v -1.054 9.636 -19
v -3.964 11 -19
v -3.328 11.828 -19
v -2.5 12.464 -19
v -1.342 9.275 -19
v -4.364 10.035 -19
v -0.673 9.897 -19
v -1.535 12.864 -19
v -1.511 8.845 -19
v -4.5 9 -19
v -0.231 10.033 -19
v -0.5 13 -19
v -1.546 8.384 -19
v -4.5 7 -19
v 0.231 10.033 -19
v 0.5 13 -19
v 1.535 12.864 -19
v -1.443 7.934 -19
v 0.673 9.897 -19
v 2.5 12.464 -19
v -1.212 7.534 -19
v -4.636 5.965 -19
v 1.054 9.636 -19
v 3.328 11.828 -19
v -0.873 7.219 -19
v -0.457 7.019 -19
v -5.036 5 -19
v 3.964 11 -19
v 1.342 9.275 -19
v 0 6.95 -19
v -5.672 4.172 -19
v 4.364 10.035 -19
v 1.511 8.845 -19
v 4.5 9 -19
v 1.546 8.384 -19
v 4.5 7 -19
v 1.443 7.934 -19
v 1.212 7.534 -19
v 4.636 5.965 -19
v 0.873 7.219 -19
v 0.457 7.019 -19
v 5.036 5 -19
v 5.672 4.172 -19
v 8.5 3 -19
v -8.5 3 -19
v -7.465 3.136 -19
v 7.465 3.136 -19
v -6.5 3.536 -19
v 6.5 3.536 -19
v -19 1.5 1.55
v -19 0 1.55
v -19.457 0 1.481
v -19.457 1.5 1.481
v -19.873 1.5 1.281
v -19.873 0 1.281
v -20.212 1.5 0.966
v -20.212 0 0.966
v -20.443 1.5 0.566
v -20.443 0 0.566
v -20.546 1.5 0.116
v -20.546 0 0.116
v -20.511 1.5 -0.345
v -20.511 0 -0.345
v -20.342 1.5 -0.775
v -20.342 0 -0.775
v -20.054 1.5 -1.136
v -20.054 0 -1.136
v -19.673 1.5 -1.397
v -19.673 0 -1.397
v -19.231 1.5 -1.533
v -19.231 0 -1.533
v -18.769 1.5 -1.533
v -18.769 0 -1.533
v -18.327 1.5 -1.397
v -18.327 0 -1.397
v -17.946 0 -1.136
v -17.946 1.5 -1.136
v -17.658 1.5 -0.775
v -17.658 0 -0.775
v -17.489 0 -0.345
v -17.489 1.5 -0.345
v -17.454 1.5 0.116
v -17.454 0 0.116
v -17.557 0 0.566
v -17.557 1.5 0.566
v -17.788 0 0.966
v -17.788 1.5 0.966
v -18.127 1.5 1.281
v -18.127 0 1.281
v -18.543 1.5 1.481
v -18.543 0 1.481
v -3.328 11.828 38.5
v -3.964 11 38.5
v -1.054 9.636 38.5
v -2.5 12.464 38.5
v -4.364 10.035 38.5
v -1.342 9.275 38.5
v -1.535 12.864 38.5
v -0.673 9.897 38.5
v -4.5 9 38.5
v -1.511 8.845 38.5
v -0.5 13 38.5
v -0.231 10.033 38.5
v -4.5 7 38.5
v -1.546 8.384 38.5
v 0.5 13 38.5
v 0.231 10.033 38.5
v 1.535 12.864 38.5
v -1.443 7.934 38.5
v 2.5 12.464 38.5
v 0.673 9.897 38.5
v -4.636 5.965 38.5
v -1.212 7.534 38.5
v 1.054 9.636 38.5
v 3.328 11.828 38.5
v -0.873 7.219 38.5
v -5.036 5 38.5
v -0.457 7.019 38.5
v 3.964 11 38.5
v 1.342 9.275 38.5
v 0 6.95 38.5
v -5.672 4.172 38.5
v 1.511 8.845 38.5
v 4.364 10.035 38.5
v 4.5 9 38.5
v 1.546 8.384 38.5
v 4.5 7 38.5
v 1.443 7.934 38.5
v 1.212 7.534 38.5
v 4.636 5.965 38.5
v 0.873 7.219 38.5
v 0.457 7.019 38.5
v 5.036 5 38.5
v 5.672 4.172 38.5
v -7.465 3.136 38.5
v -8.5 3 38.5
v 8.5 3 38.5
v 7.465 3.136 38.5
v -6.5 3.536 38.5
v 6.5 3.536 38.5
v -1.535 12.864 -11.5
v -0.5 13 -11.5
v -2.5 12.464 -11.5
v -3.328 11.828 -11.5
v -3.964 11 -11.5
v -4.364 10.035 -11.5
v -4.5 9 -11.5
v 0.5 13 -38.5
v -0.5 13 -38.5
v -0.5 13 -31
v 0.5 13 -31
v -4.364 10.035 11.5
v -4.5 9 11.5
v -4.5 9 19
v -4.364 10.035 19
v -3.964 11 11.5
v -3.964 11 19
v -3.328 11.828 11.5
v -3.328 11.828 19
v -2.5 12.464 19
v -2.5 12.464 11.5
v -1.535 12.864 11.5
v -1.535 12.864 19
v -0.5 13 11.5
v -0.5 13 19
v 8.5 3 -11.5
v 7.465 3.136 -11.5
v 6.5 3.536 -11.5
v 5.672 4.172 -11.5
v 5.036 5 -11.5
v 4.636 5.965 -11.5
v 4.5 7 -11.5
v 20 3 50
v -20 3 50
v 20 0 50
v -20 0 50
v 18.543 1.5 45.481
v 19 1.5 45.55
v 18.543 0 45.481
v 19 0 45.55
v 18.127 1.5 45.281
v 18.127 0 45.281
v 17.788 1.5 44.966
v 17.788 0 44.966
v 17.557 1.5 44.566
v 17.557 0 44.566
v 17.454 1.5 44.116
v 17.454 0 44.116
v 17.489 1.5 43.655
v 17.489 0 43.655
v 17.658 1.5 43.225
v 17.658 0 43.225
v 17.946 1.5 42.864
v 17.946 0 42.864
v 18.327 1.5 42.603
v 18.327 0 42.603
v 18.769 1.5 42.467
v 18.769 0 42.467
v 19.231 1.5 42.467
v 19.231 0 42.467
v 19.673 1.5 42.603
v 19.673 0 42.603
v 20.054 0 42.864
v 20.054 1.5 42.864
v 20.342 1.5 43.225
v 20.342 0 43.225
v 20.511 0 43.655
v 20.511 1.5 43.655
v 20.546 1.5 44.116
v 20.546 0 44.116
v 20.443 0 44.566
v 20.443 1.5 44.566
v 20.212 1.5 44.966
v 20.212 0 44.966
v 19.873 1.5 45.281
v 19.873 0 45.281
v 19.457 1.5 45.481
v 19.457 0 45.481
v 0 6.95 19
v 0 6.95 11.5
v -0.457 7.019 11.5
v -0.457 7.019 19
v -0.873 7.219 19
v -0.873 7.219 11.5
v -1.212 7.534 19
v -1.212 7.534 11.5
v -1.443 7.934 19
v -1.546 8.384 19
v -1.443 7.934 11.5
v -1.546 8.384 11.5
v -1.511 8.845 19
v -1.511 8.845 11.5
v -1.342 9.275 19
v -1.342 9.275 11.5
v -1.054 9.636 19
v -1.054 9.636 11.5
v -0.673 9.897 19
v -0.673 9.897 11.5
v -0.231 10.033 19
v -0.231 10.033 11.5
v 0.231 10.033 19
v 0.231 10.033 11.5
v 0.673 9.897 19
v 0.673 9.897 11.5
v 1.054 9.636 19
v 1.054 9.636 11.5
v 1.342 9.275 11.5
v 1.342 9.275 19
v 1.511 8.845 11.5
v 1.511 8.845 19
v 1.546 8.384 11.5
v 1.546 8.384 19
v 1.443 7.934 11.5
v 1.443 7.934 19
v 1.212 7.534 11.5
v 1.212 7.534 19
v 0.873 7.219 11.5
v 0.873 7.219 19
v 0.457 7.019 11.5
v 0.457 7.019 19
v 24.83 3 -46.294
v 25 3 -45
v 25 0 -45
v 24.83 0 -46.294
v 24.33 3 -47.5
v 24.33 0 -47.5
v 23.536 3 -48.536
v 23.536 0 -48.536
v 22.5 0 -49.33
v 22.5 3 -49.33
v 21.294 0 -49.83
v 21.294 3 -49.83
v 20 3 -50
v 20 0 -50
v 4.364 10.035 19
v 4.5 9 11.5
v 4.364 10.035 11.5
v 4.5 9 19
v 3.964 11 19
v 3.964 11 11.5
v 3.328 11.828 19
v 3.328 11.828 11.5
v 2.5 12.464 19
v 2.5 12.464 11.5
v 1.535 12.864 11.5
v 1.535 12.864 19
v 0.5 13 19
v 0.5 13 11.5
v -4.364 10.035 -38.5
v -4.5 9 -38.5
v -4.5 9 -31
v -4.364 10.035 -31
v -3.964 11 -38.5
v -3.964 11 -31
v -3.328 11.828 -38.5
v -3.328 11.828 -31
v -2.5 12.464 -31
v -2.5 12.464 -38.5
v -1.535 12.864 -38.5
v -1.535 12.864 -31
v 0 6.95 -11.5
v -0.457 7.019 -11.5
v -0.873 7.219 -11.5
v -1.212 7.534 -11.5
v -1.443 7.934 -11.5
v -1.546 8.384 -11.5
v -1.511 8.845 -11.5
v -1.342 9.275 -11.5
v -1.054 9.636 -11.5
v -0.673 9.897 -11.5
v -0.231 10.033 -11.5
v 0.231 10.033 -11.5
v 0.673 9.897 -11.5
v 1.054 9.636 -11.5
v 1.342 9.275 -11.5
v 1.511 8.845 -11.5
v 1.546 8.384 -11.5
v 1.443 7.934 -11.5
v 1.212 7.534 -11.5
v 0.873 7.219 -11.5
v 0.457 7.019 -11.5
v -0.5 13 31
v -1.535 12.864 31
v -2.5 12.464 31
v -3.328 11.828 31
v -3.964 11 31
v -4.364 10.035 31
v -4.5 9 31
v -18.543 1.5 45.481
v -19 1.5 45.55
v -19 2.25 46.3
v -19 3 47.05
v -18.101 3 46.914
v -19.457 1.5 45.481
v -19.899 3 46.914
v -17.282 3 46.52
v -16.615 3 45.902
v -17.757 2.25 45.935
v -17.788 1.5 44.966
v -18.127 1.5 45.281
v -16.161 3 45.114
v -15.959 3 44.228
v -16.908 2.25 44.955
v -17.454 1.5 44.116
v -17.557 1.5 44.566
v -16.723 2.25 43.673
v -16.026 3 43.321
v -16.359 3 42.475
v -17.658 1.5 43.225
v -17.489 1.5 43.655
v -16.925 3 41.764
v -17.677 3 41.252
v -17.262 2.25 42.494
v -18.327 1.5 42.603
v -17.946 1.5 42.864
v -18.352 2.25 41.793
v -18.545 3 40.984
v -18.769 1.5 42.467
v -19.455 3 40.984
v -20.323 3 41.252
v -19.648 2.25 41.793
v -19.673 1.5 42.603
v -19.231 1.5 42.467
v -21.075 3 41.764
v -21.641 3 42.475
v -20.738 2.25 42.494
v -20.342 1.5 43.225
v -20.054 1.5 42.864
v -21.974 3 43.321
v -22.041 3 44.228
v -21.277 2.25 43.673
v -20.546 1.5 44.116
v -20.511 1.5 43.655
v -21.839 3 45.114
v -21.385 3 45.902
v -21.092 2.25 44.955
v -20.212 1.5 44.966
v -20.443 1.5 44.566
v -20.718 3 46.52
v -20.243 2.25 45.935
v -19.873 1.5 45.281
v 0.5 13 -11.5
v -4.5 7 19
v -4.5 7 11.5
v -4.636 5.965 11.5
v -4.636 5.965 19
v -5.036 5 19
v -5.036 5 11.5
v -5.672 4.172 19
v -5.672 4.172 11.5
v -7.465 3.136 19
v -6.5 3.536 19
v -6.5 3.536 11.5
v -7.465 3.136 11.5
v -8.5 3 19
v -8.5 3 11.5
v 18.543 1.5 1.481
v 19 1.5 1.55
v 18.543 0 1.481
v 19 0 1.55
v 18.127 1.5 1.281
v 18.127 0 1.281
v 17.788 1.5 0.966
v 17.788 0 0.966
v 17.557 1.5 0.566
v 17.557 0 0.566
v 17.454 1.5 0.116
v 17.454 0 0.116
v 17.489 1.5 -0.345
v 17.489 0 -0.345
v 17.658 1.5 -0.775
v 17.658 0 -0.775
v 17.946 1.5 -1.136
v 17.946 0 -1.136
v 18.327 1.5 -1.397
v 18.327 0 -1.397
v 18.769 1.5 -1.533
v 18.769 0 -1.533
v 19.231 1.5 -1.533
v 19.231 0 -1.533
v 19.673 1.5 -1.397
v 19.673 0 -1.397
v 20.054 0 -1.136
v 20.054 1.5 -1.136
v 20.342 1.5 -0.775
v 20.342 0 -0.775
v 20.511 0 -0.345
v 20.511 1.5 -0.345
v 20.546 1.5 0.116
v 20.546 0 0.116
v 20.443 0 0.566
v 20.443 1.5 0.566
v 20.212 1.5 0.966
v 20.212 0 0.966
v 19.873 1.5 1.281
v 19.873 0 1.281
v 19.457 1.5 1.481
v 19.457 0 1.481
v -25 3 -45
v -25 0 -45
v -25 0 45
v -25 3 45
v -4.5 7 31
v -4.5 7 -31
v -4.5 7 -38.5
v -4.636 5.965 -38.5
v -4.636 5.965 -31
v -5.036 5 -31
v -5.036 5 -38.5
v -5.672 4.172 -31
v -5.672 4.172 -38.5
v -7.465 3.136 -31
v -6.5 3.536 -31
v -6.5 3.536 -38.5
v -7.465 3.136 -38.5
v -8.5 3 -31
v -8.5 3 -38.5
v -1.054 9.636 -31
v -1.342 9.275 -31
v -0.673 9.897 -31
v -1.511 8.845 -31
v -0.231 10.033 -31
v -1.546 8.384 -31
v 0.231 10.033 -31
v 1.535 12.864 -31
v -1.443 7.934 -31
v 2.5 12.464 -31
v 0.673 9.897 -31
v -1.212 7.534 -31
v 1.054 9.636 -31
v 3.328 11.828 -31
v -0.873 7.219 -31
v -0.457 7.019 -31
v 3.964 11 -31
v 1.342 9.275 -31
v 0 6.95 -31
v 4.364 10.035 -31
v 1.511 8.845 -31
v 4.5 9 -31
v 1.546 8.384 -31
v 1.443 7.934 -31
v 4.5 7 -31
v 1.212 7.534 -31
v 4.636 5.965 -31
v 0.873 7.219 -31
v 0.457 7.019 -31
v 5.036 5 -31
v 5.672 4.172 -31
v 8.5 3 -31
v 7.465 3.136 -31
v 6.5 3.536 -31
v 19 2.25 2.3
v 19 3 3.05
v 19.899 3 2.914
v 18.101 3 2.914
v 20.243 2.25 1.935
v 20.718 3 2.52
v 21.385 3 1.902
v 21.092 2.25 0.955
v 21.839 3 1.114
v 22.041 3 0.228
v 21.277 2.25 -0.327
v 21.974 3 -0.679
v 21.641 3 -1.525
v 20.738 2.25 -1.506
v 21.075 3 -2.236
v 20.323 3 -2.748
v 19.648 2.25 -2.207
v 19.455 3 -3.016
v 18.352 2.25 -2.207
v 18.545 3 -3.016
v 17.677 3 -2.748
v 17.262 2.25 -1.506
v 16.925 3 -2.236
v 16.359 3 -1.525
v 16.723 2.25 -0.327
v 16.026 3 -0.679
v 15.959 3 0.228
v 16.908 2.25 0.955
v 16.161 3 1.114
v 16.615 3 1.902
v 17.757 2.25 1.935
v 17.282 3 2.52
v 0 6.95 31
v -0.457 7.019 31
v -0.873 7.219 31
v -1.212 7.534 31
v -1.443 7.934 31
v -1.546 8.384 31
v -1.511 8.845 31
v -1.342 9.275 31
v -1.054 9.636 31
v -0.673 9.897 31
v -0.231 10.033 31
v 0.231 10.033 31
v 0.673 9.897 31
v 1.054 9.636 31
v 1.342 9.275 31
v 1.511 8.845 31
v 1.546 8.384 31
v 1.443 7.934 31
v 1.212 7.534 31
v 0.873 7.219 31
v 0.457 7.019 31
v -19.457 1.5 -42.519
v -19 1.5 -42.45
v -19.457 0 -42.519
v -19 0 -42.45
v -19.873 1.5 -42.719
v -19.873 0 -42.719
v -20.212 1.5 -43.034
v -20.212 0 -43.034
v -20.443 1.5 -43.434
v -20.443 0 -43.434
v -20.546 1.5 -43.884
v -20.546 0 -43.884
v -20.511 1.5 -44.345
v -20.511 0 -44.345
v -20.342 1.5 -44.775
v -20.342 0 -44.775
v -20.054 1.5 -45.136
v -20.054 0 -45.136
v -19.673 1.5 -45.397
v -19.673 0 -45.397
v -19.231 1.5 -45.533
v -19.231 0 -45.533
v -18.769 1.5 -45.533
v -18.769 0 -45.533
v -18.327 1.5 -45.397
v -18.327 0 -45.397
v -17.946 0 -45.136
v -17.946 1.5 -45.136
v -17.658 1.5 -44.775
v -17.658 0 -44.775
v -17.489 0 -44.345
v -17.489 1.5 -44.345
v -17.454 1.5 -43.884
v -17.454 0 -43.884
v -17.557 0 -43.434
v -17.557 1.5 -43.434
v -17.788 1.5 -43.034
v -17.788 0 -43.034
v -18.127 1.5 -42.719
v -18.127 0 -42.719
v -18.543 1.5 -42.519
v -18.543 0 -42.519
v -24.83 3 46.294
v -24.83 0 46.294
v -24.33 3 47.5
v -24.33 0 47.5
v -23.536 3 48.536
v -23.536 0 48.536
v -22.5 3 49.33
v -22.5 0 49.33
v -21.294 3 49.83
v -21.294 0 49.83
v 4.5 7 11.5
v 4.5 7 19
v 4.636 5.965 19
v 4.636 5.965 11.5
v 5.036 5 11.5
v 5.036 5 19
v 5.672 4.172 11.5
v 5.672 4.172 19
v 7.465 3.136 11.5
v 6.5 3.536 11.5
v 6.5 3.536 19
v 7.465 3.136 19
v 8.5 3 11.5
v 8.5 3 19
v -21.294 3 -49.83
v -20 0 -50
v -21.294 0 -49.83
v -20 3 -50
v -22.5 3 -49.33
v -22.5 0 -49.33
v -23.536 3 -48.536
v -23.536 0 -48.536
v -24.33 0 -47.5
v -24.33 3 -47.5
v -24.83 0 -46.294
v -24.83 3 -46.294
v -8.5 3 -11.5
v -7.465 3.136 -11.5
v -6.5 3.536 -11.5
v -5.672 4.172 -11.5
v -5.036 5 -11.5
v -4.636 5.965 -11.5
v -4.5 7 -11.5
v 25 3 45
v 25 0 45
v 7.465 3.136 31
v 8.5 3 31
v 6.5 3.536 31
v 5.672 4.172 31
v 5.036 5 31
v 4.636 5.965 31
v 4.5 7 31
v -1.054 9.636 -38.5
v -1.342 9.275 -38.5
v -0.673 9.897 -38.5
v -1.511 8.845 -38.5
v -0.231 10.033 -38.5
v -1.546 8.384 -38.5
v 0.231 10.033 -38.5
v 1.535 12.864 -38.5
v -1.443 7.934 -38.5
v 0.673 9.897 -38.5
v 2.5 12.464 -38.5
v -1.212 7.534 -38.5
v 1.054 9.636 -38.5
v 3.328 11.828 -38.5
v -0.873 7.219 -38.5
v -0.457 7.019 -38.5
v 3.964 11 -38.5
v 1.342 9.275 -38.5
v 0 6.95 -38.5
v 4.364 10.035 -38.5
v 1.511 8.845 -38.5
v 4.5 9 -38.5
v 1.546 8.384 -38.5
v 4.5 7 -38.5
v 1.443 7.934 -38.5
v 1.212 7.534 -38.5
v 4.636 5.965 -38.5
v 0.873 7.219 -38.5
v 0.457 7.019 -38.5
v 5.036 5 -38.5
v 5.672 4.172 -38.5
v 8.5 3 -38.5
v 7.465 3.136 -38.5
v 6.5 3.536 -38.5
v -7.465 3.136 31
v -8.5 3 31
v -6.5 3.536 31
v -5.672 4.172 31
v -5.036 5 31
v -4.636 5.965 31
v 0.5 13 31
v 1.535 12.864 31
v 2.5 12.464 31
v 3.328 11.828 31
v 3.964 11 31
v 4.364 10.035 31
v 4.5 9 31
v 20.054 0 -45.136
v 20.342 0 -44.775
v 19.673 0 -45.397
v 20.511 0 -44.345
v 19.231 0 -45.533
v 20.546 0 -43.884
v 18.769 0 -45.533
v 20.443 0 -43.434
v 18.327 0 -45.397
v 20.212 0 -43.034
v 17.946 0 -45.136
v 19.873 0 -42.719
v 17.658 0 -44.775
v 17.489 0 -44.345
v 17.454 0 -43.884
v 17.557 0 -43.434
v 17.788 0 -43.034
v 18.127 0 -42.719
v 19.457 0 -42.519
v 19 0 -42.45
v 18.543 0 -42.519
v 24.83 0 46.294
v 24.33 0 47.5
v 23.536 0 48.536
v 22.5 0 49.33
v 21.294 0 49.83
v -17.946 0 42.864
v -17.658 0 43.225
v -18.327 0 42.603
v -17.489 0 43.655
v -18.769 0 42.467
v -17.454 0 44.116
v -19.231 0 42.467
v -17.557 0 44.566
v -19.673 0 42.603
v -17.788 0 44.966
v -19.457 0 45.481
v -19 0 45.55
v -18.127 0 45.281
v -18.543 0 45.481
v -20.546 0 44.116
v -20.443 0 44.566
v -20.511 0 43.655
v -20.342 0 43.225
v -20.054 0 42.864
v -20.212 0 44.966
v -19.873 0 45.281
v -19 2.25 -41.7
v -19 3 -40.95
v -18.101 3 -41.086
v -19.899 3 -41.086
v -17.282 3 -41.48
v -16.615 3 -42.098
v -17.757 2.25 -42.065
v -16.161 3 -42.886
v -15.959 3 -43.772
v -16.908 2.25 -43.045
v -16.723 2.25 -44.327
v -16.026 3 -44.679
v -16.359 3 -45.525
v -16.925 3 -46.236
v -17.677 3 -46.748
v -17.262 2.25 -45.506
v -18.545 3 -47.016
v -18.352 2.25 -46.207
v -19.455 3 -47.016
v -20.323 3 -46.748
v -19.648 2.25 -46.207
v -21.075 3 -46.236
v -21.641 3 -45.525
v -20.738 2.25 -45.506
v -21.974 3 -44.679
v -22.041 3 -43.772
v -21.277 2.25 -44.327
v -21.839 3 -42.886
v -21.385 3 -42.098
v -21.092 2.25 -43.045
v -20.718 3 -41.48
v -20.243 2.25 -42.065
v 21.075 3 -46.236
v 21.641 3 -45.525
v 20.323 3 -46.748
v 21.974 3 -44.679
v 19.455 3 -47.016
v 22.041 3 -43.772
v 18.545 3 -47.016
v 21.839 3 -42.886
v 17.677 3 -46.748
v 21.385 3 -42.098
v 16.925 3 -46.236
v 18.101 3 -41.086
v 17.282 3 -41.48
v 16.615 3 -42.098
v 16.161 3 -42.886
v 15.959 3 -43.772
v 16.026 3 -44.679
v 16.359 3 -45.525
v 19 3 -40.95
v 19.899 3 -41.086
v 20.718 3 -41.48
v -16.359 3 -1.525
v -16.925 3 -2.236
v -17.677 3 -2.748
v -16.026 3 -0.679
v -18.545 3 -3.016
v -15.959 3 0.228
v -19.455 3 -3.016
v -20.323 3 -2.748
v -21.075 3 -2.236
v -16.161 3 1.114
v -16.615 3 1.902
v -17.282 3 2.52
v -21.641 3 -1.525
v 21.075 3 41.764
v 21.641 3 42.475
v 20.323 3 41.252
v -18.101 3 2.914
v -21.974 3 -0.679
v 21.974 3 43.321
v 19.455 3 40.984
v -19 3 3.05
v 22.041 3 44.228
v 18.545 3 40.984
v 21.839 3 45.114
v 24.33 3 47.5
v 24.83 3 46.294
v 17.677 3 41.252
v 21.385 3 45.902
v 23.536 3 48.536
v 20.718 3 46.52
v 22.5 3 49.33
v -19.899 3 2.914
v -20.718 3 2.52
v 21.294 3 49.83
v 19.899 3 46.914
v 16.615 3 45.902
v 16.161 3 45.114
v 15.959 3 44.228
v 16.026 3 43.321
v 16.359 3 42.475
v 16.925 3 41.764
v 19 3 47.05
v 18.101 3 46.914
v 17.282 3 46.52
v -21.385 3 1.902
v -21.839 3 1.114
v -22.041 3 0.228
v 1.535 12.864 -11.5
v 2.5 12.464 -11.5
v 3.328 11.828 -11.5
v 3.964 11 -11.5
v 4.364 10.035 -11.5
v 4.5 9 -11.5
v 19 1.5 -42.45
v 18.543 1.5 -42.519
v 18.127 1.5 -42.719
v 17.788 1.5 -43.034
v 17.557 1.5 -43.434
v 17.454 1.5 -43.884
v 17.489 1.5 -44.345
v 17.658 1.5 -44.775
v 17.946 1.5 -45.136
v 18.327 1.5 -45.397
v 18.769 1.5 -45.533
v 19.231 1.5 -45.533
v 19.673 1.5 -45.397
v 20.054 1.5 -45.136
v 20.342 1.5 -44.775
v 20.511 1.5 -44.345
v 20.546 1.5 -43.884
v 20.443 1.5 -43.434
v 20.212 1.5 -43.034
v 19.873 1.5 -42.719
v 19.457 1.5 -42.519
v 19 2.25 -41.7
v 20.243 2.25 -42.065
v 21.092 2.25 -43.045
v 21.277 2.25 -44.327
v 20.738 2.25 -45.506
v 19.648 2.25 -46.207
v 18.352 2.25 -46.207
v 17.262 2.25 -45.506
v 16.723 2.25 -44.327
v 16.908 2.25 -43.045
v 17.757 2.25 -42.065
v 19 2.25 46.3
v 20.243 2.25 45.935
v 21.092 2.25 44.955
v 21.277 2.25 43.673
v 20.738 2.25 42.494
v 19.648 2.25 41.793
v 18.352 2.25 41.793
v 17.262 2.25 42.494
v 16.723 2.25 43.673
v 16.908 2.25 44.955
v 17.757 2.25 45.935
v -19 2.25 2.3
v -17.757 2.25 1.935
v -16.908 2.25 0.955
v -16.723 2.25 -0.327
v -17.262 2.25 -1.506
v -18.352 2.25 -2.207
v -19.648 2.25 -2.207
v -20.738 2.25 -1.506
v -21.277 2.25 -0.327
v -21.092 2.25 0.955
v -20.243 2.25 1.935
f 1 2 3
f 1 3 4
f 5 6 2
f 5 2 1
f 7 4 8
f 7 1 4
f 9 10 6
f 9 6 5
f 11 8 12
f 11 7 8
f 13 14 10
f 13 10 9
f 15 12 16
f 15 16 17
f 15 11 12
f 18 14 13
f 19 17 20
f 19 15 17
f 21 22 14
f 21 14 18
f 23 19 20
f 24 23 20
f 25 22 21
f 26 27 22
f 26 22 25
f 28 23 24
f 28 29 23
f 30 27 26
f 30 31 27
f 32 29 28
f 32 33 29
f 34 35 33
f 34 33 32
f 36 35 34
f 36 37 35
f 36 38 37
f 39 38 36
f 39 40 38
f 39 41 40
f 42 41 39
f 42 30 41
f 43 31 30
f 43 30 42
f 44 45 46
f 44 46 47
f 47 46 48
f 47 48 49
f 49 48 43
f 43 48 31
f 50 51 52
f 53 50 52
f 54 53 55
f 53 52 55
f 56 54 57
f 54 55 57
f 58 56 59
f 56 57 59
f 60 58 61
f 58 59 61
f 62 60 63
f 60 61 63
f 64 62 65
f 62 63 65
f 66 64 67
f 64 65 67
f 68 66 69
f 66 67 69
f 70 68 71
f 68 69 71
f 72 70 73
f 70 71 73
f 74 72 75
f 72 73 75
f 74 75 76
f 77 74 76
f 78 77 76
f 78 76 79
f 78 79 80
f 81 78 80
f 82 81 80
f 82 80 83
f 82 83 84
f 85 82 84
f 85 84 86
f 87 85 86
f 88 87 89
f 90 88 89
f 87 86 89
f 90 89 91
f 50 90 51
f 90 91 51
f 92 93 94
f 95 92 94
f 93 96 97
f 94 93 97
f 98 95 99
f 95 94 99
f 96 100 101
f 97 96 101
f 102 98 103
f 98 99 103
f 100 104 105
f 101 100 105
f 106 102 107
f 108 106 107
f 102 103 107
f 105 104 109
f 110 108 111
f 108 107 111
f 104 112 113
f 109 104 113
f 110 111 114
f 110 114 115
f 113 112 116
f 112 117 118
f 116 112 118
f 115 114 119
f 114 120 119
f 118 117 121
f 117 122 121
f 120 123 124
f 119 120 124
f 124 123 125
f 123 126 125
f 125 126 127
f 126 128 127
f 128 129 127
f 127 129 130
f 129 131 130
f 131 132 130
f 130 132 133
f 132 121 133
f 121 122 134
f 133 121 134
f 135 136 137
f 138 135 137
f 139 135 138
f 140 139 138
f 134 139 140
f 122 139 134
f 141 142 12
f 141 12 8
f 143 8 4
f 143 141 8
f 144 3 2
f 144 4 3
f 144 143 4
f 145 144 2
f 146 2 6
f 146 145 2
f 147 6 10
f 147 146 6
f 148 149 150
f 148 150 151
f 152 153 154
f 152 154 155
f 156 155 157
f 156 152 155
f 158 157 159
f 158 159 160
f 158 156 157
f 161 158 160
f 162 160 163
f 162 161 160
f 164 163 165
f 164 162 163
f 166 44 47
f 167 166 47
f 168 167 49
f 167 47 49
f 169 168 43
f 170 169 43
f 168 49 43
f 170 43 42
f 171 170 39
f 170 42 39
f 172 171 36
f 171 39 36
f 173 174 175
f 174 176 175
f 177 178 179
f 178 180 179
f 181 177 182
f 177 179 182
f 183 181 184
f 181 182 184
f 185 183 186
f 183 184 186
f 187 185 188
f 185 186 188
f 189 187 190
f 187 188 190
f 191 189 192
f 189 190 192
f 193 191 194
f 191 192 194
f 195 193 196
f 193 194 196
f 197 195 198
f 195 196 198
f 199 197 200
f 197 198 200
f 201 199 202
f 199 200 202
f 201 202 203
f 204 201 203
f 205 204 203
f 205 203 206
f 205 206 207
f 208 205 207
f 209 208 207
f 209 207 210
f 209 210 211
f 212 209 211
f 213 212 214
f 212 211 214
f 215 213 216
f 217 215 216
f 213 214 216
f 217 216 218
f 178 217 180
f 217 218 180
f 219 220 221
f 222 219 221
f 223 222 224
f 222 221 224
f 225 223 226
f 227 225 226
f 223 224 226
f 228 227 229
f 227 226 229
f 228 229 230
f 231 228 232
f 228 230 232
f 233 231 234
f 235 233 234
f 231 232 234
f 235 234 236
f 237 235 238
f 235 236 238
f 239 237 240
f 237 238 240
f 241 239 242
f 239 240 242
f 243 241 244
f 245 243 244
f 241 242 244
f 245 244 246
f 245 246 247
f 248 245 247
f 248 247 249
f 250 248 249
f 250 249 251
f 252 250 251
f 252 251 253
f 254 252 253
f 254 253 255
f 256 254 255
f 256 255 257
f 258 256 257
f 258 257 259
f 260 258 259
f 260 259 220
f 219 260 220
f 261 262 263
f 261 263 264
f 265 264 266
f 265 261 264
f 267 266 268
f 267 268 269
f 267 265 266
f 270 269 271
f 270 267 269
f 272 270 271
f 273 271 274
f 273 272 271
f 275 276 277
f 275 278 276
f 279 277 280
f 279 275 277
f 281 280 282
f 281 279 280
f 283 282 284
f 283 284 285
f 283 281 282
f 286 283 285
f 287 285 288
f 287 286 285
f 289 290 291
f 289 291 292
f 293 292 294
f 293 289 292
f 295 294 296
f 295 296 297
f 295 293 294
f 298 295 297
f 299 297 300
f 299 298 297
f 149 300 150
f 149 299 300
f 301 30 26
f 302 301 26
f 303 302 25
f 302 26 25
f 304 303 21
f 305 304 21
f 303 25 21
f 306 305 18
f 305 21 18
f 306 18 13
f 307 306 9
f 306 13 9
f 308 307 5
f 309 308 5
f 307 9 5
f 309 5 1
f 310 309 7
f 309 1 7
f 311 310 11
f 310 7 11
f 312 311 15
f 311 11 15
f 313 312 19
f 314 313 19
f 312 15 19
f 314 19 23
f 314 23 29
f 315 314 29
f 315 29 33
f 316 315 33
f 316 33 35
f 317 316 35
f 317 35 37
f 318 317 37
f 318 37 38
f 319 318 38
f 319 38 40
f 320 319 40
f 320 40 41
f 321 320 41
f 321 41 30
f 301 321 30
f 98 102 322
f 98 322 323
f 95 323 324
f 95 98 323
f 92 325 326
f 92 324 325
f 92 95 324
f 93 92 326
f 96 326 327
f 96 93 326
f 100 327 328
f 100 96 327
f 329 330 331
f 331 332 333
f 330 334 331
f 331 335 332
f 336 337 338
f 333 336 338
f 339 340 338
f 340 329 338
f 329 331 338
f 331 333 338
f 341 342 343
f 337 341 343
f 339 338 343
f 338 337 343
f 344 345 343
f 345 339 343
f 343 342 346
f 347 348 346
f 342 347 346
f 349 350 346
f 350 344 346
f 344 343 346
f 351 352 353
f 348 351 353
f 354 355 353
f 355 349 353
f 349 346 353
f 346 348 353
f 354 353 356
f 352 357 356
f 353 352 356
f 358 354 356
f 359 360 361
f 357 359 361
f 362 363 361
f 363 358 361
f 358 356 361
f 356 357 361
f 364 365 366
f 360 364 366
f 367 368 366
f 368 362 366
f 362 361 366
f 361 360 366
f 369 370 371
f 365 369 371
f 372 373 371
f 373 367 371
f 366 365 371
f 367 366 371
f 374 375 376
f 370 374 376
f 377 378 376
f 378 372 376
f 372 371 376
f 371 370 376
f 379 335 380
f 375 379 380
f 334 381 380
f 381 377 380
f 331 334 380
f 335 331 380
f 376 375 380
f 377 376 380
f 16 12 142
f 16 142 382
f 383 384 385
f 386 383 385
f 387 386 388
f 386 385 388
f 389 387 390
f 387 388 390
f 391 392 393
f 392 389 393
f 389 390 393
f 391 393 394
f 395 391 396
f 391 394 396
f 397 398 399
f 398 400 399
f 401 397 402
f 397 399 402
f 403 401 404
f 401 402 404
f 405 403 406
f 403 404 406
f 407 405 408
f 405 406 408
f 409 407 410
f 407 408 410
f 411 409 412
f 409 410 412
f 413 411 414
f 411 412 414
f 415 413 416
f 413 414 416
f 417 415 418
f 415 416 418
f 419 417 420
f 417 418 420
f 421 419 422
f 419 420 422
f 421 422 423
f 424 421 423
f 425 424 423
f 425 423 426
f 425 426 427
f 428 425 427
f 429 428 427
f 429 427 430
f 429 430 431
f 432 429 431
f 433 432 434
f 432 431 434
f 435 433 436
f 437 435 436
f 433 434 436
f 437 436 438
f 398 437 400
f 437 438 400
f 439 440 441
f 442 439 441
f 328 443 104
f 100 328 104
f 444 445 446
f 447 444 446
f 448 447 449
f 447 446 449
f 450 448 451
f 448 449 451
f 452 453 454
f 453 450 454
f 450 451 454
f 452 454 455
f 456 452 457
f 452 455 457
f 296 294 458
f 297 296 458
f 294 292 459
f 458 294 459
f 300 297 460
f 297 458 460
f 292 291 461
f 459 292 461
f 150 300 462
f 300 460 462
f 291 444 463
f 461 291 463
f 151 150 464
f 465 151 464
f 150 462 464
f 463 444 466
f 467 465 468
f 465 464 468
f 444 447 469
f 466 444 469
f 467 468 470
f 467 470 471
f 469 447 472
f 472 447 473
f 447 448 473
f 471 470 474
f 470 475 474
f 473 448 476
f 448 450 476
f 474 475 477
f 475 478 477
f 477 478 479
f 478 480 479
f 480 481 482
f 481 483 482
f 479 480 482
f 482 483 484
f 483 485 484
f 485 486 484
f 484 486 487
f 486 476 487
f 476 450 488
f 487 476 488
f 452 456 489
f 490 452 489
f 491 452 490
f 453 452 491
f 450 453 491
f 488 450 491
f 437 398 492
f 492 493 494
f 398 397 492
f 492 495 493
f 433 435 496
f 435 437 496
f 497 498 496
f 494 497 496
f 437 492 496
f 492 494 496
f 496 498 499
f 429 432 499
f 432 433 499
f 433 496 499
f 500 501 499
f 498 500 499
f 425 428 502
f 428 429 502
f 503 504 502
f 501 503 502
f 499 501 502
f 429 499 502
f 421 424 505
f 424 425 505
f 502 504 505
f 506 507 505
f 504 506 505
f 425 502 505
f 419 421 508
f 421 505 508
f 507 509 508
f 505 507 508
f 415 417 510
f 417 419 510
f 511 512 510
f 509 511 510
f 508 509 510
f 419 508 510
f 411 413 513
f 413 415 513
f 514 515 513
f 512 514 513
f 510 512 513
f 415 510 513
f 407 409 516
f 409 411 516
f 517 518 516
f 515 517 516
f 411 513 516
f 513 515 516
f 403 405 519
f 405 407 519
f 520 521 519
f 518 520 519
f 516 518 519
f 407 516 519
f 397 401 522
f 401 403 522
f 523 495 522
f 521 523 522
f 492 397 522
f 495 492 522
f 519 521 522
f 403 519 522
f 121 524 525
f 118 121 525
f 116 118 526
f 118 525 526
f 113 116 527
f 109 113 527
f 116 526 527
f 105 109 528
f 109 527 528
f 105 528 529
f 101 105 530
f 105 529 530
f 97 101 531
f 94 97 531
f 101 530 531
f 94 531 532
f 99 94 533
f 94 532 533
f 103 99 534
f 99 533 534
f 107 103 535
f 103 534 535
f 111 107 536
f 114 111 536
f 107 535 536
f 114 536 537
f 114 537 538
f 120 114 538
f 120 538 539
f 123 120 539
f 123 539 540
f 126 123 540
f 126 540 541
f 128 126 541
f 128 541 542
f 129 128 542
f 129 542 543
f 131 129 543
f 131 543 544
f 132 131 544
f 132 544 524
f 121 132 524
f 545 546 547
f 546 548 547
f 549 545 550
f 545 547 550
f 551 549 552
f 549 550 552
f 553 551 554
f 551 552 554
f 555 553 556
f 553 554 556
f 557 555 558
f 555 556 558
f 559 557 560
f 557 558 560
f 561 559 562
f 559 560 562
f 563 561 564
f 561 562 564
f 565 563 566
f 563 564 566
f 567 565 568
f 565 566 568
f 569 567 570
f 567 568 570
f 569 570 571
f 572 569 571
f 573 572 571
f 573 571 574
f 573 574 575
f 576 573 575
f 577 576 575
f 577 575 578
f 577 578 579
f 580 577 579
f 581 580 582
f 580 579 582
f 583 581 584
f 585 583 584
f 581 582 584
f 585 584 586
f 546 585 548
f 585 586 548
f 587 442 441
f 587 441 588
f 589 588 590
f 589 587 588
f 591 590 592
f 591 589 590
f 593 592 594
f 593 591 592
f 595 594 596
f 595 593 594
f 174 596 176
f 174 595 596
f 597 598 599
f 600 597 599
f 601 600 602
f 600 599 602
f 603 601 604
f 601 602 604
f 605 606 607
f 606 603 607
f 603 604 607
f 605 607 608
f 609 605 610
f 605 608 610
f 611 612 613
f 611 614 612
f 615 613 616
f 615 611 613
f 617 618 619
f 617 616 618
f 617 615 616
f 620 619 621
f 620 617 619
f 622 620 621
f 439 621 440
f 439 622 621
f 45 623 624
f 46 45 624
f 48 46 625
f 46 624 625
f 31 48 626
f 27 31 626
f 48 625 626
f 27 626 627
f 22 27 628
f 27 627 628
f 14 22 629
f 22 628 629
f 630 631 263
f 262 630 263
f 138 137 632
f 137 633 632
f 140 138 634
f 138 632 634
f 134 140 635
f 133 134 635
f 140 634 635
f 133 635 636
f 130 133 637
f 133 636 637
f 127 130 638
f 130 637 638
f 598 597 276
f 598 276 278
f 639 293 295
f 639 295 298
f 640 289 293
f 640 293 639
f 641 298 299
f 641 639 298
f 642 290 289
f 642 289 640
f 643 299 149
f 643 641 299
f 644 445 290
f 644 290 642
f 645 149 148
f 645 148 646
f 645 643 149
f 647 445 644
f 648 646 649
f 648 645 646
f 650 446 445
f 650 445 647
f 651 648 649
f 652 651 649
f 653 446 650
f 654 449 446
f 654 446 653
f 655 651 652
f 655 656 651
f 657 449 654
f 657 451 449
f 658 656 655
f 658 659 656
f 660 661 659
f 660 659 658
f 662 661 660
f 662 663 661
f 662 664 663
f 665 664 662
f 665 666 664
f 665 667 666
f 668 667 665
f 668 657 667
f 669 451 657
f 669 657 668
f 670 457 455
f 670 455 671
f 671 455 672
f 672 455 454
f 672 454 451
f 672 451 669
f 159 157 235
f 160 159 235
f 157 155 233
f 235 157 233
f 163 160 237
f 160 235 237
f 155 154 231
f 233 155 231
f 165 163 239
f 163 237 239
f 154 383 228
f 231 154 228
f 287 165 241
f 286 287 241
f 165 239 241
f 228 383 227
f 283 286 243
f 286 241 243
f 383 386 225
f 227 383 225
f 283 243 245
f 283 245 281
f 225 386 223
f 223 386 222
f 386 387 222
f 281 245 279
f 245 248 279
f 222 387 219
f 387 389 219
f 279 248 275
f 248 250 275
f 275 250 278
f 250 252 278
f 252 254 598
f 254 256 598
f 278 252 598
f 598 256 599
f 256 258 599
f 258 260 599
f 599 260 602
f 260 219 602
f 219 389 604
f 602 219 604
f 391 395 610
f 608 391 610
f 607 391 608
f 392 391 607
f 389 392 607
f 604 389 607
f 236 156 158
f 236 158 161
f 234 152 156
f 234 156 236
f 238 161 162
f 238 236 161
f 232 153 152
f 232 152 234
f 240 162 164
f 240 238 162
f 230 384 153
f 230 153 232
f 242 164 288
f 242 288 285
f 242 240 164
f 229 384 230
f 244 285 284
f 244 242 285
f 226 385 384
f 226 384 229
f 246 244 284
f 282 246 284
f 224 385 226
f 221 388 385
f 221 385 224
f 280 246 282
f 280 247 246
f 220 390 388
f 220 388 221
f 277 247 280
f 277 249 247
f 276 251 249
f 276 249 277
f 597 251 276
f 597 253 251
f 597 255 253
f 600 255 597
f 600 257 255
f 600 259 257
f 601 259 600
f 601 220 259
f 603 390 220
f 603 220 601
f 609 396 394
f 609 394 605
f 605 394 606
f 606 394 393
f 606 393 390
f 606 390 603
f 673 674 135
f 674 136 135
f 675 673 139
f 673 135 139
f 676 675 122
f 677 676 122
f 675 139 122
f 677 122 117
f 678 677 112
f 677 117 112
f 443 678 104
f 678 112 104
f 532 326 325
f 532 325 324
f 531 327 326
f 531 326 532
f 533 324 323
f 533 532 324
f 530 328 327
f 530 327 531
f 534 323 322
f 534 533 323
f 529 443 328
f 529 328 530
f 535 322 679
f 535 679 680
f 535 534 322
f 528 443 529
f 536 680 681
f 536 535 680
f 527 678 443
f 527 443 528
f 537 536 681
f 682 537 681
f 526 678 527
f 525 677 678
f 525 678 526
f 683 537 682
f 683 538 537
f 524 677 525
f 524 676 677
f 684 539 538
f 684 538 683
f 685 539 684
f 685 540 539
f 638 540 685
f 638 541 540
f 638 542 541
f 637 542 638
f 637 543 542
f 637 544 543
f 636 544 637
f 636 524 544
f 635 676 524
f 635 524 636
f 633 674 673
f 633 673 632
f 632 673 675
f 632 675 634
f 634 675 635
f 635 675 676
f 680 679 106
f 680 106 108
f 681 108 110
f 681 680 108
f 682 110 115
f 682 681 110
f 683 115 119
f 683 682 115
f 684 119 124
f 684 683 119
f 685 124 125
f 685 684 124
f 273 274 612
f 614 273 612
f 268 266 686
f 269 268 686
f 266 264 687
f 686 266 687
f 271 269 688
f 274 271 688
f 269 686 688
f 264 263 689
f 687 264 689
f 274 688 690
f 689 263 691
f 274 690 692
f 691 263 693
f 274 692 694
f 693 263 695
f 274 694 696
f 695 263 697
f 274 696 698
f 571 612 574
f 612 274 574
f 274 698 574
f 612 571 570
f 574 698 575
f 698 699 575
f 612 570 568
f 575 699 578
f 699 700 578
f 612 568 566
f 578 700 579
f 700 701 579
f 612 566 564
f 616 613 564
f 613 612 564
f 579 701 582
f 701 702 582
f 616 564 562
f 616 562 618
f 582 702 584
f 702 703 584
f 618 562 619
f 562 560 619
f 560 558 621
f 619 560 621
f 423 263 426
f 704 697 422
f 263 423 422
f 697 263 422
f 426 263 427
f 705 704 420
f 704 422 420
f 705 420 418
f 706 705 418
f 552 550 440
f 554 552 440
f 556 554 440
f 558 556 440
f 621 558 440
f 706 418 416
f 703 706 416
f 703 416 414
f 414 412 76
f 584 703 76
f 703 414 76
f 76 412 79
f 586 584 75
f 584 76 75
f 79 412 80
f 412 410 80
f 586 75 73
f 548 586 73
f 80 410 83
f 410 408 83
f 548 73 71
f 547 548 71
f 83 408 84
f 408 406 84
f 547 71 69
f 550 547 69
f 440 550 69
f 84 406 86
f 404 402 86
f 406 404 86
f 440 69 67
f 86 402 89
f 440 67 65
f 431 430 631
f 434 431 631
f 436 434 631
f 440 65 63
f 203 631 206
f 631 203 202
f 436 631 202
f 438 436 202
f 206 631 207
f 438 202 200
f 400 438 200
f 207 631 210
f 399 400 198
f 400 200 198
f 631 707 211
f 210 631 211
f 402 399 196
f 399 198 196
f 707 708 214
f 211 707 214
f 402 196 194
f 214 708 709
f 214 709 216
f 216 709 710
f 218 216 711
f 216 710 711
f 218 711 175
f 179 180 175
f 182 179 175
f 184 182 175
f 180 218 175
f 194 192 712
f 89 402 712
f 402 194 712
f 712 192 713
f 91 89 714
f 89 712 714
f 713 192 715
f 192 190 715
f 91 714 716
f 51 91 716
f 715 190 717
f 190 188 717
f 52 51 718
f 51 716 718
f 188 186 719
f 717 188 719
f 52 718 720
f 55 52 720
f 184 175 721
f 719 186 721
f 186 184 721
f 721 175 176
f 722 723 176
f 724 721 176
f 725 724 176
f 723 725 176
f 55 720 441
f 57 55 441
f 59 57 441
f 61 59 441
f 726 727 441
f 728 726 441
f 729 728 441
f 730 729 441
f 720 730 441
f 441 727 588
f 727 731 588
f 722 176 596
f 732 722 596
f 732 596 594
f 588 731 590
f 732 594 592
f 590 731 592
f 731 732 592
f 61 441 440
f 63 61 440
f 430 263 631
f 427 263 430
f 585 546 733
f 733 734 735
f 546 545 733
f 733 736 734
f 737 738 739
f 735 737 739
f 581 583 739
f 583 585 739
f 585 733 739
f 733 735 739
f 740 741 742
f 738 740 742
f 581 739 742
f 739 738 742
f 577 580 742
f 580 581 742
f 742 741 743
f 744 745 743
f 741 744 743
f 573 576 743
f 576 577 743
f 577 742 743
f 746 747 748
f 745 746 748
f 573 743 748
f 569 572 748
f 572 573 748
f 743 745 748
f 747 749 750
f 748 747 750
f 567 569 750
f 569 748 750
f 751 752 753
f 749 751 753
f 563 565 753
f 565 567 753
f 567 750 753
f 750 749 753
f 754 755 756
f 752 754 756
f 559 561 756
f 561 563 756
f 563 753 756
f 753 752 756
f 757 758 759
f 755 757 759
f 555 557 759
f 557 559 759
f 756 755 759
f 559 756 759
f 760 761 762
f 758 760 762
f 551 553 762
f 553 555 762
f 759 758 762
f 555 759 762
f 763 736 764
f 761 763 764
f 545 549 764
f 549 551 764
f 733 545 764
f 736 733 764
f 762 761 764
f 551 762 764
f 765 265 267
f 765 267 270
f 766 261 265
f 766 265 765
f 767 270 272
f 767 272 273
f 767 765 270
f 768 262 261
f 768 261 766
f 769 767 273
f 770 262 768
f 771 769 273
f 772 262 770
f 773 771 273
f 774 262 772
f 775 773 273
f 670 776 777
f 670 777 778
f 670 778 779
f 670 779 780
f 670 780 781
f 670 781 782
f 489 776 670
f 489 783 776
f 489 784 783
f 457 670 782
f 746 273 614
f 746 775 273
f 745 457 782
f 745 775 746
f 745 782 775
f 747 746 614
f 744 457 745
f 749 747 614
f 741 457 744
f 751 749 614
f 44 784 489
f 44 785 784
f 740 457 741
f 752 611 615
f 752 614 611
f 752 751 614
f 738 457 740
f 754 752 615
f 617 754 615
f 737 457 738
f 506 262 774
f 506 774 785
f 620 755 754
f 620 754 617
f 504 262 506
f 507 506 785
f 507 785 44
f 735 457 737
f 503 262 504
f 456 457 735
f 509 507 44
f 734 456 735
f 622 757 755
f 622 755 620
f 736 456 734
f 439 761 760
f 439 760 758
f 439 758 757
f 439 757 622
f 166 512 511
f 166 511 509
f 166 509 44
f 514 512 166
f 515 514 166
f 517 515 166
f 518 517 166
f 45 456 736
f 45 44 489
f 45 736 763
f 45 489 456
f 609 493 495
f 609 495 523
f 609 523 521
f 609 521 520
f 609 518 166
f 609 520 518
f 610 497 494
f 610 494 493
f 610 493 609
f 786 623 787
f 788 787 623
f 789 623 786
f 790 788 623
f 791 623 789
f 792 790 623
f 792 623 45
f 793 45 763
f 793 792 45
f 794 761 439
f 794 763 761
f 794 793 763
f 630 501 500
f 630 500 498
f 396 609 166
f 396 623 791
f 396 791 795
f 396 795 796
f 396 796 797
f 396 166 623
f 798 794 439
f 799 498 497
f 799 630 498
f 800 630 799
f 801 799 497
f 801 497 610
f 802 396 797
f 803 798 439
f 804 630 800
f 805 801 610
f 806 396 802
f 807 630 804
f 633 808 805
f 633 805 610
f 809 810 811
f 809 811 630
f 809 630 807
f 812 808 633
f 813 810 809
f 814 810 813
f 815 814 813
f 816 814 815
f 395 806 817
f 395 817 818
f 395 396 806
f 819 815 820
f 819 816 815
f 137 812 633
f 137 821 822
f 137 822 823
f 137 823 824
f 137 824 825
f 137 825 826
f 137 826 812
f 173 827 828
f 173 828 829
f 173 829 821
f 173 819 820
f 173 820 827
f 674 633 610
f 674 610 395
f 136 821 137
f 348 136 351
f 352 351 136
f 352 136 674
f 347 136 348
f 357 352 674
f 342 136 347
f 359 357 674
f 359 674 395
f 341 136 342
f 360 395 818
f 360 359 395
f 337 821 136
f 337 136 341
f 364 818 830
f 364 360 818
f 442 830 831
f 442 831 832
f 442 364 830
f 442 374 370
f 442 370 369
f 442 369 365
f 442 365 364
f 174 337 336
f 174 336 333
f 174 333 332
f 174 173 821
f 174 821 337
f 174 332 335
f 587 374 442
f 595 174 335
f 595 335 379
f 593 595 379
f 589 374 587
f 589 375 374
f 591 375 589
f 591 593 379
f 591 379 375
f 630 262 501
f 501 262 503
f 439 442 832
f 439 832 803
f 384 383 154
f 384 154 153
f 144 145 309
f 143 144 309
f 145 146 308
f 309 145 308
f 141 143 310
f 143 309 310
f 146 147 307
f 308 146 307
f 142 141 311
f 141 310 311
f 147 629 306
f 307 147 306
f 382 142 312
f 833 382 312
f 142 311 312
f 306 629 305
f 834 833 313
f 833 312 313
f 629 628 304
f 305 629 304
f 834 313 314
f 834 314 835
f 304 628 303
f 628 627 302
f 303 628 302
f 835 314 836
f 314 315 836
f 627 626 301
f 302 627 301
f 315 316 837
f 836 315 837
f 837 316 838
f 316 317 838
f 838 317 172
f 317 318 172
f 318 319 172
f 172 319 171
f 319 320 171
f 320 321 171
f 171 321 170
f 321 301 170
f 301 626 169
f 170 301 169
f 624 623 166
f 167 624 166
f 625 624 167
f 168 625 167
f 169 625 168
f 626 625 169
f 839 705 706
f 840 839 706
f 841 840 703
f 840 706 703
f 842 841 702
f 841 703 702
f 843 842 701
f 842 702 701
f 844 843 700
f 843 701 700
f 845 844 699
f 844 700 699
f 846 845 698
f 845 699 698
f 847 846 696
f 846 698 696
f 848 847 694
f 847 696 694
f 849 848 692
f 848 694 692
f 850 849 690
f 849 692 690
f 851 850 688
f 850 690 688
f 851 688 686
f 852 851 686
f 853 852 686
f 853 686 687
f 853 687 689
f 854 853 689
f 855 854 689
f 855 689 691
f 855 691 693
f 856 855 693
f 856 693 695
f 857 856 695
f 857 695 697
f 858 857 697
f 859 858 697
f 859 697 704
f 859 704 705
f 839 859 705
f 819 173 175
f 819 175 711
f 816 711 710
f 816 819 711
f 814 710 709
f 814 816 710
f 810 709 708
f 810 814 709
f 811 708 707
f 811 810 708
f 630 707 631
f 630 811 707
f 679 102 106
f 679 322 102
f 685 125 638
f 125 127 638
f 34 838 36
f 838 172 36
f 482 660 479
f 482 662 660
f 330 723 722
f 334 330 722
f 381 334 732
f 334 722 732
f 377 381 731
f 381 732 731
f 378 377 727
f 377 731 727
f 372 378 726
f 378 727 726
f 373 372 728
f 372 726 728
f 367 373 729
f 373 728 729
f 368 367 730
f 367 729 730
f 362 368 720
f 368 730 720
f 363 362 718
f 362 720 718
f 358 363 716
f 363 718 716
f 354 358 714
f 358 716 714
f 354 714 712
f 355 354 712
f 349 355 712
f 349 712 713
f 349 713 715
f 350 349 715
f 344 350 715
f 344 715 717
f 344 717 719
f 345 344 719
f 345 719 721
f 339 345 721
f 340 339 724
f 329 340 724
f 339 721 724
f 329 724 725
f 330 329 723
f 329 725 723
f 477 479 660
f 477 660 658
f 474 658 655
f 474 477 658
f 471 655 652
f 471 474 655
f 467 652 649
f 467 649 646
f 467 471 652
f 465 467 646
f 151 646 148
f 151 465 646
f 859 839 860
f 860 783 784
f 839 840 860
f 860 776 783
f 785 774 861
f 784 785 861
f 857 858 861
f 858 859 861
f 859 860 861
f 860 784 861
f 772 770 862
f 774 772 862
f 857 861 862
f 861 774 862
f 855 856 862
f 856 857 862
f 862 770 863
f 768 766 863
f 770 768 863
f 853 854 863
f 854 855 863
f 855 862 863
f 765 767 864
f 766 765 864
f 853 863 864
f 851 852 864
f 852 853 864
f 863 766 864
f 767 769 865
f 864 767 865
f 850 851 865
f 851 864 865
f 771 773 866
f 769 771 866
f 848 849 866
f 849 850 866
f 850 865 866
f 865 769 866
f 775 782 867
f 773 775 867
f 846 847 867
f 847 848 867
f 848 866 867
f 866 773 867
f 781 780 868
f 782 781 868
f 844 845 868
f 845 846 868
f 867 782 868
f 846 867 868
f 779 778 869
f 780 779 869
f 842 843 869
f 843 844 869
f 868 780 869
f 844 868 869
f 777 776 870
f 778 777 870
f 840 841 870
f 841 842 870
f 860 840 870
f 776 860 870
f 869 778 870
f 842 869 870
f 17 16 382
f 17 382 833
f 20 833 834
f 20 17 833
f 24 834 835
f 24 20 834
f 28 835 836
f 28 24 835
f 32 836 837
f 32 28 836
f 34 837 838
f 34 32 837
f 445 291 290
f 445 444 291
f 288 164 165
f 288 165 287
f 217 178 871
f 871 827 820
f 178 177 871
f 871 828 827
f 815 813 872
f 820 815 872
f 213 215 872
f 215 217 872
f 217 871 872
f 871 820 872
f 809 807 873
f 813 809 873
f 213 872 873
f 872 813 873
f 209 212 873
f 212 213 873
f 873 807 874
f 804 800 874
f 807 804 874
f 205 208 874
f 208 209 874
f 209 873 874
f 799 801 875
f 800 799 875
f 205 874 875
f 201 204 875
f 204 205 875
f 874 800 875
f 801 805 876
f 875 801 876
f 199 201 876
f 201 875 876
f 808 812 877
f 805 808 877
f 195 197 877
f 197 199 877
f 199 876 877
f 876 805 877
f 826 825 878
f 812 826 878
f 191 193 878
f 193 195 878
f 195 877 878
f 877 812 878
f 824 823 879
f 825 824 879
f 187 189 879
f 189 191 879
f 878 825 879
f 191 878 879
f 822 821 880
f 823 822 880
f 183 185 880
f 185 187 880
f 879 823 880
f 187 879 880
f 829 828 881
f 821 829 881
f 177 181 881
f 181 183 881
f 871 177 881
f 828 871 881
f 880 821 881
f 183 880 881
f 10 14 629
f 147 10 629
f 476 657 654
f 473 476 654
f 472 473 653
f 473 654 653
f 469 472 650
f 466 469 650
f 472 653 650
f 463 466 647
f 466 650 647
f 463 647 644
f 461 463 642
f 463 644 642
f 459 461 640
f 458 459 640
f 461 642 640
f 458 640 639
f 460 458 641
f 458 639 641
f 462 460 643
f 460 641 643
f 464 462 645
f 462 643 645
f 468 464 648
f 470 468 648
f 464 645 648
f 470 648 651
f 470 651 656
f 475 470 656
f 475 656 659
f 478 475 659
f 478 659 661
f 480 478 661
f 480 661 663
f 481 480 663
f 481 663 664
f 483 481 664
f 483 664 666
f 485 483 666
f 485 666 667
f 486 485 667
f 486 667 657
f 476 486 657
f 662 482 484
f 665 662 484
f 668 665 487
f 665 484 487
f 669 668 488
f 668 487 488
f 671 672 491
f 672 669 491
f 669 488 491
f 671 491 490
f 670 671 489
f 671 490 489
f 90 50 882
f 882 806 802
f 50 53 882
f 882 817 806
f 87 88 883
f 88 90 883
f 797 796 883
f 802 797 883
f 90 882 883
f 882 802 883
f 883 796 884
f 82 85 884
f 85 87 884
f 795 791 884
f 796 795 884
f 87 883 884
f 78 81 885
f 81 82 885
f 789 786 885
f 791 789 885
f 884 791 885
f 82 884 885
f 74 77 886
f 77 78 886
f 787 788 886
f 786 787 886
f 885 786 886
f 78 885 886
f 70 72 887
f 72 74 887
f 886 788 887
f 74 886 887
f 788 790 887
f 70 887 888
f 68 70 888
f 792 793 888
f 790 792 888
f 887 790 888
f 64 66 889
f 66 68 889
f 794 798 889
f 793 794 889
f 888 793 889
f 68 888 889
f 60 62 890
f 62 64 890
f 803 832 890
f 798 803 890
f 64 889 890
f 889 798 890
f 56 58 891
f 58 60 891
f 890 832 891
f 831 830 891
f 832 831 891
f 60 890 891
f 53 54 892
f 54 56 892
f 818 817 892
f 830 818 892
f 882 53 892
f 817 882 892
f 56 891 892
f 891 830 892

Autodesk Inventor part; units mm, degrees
ref_plane "YZ Plane" through (0, 0, 0) normal (1, 0, 0) x (0, 1, 0)
ref_plane "XZ Plane" through (0, 0, 0) normal (0, 1, 0) x (-1, 0, 0)
ref_plane "XY Plane" through (0, 0, 0) normal (0, 0, 1) x (1, 0, 0)
sketch "Sketch1" plane through (0, 0, 0) normal (0, 1, 0) x (-1, 0, 0)
  line L0 (25, 50) -> (-25, 50)
  line L1 (-25, 50) -> (-25, -50)
  line L2 (-25, -50) -> (25, -50)
  line L3 (25, -50) -> (25, 50)
  point P0 (0, 0)
  dimension "d0" = 100
  dimension "d1" = 50
  dimension "d2" = 25
  dimension "d3" = 50
extrude "Extrusion1" add sketch "Sketch1" along normal blind 3
sketch "Sketch2" plane through (0, 3, 0) normal (0, 1, 0) x (1, 0, 0)
  line L0 (-4.5, -30.5) -> (4.5, -30.5)
  line L1 (4.5, -30.5) -> (4.5, -19.5)
  line L2 (4.5, -19.5) -> (-4.5, -19.5)
  line L3 (-4.5, -19.5) -> (-4.5, -30.5)
  line L4 (-4.5, -19.5) -> (-4.5, -19)
  line L5 (-4.5, -19) -> (4.5, -19)
  line L6 (4.5, -19) -> (4.5, -19.5)
  line L7 (-4.5, -19) -> (-4.5, -11.5)
  line L8 (-4.5, -11.5) -> (4.5, -11.5)
  line L9 (4.5, -11.5) -> (4.5, -19)
  line L10 (-4.5, -30.5) -> (-4.5, -31)
  line L11 (-4.5, -31) -> (4.5, -31)
  line L12 (4.5, -31) -> (4.5, -30.5)
  line L13 (-4.5, -31) -> (-4.5, -38.5)
  line L14 (-4.5, -38.5) -> (4.5, -38.5)
  line L15 (4.5, -38.5) -> (4.5, -31)
  line L16 (-25, -50) -> (25, -50) projected
  line L17 (31.6742, 0) -> (-41.419, 0)
  line L18 (-4.5, 30.5) -> (4.5, 30.5)
  line L19 (4.5, 30.5) -> (4.5, 19.5)
  line L20 (4.5, 19.5) -> (-4.5, 19.5)
  line L21 (-4.5, 19.5) -> (-4.5, 30.5)
  line L22 (-4.5, 19.5) -> (-4.5, 19)
  line L23 (-4.5, 19) -> (4.5, 19)
  line L24 (4.5, 19) -> (4.5, 19.5)
  line L25 (-4.5, 19) -> (-4.5, 11.5)
  line L26 (-4.5, 11.5) -> (4.5, 11.5)
  line L27 (4.5, 11.5) -> (4.5, 19)
  line L28 (-4.5, 30.5) -> (-4.5, 31)
  line L29 (-4.5, 31) -> (4.5, 31)
  line L30 (4.5, 31) -> (4.5, 30.5)
  line L31 (-4.5, 31) -> (-4.5, 38.5)
  line L32 (-4.5, 38.5) -> (4.5, 38.5)
  line L33 (4.5, 38.5) -> (4.5, 31)
  line L34 (-25, 50) -> (-25, -50) projected
  line L35 (25, -50) -> (25, 50) projected
  line L36 (25, 50) -> (-25, 50) projected
  point P0 (0, 0)
  point P1 (-19, -44)
  point P2 (-19, 0)
  point P3 (-19, 44)
  point P4 (19, -44)
  point P5 (19, 0)
  point P6 (19, 44)
  dimension "d6" = 9
  dimension "d7" = 11
  dimension "d8" = 4.5
  dimension "d9" = 0.5
  dimension "d10" = 0.5
  dimension "d11" = 27
  dimension "d12" = 7.5
  dimension "d14" = 11.5
  dimension "d27" = 6
  dimension "d28" = 6
  dimension "d29" = 6
  dimension "d30" = 6
  dimension "d31" = 50
  dimension "d43" = 39
extrude "Extrusion2" add sketch "Sketch2" along normal blind 10 contours L11 L15 L14 L13 | L7 L8 L9 L5 | L31 L32 L33 L29 | L23 L27 L26 L25
sketch "Sketch3" plane through (-4.5, 3, 38.5) normal (0, 0, 1) x (1, 0, 0)
  line L0 (9, 0) -> (0, 0) projected
  line L1 (9, 0) -> (9, 10) projected
  line L2 (0, 10) -> (9, 10) projected
  line L3 (0, 0) -> (0, 10) projected
  point P0 (4.5, -3)
  point P1 (4.5, 5.5)
  point P2 (4.5, 10)
  dimension "d17" = 4.5
  dimension "d18" = 4.5
hole "Hole1" at (0, 8.5, 38.5) direction (0, 0, -1) diameter 3.1 end through all
fillet "Fillet1" radius 4 16 edges at (-4.5, 13, 34.75) (4.5, 13, 34.75) (-4.5, 13, 15.25) (4.5, 13, 15.25) (-4.5, 13, -15.25) (4.5, 13, -15.25) (-4.5, 13, -34.75) (4.5, 13, -34.75) (-4.5, 3, -34.75) (-4.5, 3, -15.25) (-4.5, 3, 15.25) (-4.5, 3, 34.75) (4.5, 3, 34.75) (4.5, 3, 15.25) (4.5, 3, -15.25) (4.5, 3, -34.75)
hole "Hole2" at (-19, 3, 44) at (-19, 3, 0) at (-19, 3, -44) at (19, 3, 44) at (19, 3, 0) at (19, 3, -44) direction (0, -1, 0) diameter 3.1 end through all
chamfer "Chamfer1" distance 1.5 angle 45 6 edges at (19, 3, -45.55) (19, 3, -1.55) (-19, 3, -45.55) (19, 3, 42.45) (-19, 3, -1.55) (-19, 3, 42.45)
fillet "Fillet2" radius 5 4 edges at (25, 1.5, 50) (-25, 1.5, 50) (-25, 1.5, -50) (25, 1.5, -50)
equation "\"d2\" = 0.5 * d1"
equation "\"d3\" = 0.5 * d0"
equation "\"d8\" = 0.5 * d6"
equation "\"d10\" = d9"
equation "\"d12\" = -0.5 * d10 - 0.5 * d7 + 0.5 * d11 - 0.5 * d9"
equation "\"d28\" = d27"
equation "\"d29\" = d28"
equation "\"d30\" = d29"
equation "\"d18\" = d17"
properties part number "3DP_PLA_Stand_Leg_Mount"
